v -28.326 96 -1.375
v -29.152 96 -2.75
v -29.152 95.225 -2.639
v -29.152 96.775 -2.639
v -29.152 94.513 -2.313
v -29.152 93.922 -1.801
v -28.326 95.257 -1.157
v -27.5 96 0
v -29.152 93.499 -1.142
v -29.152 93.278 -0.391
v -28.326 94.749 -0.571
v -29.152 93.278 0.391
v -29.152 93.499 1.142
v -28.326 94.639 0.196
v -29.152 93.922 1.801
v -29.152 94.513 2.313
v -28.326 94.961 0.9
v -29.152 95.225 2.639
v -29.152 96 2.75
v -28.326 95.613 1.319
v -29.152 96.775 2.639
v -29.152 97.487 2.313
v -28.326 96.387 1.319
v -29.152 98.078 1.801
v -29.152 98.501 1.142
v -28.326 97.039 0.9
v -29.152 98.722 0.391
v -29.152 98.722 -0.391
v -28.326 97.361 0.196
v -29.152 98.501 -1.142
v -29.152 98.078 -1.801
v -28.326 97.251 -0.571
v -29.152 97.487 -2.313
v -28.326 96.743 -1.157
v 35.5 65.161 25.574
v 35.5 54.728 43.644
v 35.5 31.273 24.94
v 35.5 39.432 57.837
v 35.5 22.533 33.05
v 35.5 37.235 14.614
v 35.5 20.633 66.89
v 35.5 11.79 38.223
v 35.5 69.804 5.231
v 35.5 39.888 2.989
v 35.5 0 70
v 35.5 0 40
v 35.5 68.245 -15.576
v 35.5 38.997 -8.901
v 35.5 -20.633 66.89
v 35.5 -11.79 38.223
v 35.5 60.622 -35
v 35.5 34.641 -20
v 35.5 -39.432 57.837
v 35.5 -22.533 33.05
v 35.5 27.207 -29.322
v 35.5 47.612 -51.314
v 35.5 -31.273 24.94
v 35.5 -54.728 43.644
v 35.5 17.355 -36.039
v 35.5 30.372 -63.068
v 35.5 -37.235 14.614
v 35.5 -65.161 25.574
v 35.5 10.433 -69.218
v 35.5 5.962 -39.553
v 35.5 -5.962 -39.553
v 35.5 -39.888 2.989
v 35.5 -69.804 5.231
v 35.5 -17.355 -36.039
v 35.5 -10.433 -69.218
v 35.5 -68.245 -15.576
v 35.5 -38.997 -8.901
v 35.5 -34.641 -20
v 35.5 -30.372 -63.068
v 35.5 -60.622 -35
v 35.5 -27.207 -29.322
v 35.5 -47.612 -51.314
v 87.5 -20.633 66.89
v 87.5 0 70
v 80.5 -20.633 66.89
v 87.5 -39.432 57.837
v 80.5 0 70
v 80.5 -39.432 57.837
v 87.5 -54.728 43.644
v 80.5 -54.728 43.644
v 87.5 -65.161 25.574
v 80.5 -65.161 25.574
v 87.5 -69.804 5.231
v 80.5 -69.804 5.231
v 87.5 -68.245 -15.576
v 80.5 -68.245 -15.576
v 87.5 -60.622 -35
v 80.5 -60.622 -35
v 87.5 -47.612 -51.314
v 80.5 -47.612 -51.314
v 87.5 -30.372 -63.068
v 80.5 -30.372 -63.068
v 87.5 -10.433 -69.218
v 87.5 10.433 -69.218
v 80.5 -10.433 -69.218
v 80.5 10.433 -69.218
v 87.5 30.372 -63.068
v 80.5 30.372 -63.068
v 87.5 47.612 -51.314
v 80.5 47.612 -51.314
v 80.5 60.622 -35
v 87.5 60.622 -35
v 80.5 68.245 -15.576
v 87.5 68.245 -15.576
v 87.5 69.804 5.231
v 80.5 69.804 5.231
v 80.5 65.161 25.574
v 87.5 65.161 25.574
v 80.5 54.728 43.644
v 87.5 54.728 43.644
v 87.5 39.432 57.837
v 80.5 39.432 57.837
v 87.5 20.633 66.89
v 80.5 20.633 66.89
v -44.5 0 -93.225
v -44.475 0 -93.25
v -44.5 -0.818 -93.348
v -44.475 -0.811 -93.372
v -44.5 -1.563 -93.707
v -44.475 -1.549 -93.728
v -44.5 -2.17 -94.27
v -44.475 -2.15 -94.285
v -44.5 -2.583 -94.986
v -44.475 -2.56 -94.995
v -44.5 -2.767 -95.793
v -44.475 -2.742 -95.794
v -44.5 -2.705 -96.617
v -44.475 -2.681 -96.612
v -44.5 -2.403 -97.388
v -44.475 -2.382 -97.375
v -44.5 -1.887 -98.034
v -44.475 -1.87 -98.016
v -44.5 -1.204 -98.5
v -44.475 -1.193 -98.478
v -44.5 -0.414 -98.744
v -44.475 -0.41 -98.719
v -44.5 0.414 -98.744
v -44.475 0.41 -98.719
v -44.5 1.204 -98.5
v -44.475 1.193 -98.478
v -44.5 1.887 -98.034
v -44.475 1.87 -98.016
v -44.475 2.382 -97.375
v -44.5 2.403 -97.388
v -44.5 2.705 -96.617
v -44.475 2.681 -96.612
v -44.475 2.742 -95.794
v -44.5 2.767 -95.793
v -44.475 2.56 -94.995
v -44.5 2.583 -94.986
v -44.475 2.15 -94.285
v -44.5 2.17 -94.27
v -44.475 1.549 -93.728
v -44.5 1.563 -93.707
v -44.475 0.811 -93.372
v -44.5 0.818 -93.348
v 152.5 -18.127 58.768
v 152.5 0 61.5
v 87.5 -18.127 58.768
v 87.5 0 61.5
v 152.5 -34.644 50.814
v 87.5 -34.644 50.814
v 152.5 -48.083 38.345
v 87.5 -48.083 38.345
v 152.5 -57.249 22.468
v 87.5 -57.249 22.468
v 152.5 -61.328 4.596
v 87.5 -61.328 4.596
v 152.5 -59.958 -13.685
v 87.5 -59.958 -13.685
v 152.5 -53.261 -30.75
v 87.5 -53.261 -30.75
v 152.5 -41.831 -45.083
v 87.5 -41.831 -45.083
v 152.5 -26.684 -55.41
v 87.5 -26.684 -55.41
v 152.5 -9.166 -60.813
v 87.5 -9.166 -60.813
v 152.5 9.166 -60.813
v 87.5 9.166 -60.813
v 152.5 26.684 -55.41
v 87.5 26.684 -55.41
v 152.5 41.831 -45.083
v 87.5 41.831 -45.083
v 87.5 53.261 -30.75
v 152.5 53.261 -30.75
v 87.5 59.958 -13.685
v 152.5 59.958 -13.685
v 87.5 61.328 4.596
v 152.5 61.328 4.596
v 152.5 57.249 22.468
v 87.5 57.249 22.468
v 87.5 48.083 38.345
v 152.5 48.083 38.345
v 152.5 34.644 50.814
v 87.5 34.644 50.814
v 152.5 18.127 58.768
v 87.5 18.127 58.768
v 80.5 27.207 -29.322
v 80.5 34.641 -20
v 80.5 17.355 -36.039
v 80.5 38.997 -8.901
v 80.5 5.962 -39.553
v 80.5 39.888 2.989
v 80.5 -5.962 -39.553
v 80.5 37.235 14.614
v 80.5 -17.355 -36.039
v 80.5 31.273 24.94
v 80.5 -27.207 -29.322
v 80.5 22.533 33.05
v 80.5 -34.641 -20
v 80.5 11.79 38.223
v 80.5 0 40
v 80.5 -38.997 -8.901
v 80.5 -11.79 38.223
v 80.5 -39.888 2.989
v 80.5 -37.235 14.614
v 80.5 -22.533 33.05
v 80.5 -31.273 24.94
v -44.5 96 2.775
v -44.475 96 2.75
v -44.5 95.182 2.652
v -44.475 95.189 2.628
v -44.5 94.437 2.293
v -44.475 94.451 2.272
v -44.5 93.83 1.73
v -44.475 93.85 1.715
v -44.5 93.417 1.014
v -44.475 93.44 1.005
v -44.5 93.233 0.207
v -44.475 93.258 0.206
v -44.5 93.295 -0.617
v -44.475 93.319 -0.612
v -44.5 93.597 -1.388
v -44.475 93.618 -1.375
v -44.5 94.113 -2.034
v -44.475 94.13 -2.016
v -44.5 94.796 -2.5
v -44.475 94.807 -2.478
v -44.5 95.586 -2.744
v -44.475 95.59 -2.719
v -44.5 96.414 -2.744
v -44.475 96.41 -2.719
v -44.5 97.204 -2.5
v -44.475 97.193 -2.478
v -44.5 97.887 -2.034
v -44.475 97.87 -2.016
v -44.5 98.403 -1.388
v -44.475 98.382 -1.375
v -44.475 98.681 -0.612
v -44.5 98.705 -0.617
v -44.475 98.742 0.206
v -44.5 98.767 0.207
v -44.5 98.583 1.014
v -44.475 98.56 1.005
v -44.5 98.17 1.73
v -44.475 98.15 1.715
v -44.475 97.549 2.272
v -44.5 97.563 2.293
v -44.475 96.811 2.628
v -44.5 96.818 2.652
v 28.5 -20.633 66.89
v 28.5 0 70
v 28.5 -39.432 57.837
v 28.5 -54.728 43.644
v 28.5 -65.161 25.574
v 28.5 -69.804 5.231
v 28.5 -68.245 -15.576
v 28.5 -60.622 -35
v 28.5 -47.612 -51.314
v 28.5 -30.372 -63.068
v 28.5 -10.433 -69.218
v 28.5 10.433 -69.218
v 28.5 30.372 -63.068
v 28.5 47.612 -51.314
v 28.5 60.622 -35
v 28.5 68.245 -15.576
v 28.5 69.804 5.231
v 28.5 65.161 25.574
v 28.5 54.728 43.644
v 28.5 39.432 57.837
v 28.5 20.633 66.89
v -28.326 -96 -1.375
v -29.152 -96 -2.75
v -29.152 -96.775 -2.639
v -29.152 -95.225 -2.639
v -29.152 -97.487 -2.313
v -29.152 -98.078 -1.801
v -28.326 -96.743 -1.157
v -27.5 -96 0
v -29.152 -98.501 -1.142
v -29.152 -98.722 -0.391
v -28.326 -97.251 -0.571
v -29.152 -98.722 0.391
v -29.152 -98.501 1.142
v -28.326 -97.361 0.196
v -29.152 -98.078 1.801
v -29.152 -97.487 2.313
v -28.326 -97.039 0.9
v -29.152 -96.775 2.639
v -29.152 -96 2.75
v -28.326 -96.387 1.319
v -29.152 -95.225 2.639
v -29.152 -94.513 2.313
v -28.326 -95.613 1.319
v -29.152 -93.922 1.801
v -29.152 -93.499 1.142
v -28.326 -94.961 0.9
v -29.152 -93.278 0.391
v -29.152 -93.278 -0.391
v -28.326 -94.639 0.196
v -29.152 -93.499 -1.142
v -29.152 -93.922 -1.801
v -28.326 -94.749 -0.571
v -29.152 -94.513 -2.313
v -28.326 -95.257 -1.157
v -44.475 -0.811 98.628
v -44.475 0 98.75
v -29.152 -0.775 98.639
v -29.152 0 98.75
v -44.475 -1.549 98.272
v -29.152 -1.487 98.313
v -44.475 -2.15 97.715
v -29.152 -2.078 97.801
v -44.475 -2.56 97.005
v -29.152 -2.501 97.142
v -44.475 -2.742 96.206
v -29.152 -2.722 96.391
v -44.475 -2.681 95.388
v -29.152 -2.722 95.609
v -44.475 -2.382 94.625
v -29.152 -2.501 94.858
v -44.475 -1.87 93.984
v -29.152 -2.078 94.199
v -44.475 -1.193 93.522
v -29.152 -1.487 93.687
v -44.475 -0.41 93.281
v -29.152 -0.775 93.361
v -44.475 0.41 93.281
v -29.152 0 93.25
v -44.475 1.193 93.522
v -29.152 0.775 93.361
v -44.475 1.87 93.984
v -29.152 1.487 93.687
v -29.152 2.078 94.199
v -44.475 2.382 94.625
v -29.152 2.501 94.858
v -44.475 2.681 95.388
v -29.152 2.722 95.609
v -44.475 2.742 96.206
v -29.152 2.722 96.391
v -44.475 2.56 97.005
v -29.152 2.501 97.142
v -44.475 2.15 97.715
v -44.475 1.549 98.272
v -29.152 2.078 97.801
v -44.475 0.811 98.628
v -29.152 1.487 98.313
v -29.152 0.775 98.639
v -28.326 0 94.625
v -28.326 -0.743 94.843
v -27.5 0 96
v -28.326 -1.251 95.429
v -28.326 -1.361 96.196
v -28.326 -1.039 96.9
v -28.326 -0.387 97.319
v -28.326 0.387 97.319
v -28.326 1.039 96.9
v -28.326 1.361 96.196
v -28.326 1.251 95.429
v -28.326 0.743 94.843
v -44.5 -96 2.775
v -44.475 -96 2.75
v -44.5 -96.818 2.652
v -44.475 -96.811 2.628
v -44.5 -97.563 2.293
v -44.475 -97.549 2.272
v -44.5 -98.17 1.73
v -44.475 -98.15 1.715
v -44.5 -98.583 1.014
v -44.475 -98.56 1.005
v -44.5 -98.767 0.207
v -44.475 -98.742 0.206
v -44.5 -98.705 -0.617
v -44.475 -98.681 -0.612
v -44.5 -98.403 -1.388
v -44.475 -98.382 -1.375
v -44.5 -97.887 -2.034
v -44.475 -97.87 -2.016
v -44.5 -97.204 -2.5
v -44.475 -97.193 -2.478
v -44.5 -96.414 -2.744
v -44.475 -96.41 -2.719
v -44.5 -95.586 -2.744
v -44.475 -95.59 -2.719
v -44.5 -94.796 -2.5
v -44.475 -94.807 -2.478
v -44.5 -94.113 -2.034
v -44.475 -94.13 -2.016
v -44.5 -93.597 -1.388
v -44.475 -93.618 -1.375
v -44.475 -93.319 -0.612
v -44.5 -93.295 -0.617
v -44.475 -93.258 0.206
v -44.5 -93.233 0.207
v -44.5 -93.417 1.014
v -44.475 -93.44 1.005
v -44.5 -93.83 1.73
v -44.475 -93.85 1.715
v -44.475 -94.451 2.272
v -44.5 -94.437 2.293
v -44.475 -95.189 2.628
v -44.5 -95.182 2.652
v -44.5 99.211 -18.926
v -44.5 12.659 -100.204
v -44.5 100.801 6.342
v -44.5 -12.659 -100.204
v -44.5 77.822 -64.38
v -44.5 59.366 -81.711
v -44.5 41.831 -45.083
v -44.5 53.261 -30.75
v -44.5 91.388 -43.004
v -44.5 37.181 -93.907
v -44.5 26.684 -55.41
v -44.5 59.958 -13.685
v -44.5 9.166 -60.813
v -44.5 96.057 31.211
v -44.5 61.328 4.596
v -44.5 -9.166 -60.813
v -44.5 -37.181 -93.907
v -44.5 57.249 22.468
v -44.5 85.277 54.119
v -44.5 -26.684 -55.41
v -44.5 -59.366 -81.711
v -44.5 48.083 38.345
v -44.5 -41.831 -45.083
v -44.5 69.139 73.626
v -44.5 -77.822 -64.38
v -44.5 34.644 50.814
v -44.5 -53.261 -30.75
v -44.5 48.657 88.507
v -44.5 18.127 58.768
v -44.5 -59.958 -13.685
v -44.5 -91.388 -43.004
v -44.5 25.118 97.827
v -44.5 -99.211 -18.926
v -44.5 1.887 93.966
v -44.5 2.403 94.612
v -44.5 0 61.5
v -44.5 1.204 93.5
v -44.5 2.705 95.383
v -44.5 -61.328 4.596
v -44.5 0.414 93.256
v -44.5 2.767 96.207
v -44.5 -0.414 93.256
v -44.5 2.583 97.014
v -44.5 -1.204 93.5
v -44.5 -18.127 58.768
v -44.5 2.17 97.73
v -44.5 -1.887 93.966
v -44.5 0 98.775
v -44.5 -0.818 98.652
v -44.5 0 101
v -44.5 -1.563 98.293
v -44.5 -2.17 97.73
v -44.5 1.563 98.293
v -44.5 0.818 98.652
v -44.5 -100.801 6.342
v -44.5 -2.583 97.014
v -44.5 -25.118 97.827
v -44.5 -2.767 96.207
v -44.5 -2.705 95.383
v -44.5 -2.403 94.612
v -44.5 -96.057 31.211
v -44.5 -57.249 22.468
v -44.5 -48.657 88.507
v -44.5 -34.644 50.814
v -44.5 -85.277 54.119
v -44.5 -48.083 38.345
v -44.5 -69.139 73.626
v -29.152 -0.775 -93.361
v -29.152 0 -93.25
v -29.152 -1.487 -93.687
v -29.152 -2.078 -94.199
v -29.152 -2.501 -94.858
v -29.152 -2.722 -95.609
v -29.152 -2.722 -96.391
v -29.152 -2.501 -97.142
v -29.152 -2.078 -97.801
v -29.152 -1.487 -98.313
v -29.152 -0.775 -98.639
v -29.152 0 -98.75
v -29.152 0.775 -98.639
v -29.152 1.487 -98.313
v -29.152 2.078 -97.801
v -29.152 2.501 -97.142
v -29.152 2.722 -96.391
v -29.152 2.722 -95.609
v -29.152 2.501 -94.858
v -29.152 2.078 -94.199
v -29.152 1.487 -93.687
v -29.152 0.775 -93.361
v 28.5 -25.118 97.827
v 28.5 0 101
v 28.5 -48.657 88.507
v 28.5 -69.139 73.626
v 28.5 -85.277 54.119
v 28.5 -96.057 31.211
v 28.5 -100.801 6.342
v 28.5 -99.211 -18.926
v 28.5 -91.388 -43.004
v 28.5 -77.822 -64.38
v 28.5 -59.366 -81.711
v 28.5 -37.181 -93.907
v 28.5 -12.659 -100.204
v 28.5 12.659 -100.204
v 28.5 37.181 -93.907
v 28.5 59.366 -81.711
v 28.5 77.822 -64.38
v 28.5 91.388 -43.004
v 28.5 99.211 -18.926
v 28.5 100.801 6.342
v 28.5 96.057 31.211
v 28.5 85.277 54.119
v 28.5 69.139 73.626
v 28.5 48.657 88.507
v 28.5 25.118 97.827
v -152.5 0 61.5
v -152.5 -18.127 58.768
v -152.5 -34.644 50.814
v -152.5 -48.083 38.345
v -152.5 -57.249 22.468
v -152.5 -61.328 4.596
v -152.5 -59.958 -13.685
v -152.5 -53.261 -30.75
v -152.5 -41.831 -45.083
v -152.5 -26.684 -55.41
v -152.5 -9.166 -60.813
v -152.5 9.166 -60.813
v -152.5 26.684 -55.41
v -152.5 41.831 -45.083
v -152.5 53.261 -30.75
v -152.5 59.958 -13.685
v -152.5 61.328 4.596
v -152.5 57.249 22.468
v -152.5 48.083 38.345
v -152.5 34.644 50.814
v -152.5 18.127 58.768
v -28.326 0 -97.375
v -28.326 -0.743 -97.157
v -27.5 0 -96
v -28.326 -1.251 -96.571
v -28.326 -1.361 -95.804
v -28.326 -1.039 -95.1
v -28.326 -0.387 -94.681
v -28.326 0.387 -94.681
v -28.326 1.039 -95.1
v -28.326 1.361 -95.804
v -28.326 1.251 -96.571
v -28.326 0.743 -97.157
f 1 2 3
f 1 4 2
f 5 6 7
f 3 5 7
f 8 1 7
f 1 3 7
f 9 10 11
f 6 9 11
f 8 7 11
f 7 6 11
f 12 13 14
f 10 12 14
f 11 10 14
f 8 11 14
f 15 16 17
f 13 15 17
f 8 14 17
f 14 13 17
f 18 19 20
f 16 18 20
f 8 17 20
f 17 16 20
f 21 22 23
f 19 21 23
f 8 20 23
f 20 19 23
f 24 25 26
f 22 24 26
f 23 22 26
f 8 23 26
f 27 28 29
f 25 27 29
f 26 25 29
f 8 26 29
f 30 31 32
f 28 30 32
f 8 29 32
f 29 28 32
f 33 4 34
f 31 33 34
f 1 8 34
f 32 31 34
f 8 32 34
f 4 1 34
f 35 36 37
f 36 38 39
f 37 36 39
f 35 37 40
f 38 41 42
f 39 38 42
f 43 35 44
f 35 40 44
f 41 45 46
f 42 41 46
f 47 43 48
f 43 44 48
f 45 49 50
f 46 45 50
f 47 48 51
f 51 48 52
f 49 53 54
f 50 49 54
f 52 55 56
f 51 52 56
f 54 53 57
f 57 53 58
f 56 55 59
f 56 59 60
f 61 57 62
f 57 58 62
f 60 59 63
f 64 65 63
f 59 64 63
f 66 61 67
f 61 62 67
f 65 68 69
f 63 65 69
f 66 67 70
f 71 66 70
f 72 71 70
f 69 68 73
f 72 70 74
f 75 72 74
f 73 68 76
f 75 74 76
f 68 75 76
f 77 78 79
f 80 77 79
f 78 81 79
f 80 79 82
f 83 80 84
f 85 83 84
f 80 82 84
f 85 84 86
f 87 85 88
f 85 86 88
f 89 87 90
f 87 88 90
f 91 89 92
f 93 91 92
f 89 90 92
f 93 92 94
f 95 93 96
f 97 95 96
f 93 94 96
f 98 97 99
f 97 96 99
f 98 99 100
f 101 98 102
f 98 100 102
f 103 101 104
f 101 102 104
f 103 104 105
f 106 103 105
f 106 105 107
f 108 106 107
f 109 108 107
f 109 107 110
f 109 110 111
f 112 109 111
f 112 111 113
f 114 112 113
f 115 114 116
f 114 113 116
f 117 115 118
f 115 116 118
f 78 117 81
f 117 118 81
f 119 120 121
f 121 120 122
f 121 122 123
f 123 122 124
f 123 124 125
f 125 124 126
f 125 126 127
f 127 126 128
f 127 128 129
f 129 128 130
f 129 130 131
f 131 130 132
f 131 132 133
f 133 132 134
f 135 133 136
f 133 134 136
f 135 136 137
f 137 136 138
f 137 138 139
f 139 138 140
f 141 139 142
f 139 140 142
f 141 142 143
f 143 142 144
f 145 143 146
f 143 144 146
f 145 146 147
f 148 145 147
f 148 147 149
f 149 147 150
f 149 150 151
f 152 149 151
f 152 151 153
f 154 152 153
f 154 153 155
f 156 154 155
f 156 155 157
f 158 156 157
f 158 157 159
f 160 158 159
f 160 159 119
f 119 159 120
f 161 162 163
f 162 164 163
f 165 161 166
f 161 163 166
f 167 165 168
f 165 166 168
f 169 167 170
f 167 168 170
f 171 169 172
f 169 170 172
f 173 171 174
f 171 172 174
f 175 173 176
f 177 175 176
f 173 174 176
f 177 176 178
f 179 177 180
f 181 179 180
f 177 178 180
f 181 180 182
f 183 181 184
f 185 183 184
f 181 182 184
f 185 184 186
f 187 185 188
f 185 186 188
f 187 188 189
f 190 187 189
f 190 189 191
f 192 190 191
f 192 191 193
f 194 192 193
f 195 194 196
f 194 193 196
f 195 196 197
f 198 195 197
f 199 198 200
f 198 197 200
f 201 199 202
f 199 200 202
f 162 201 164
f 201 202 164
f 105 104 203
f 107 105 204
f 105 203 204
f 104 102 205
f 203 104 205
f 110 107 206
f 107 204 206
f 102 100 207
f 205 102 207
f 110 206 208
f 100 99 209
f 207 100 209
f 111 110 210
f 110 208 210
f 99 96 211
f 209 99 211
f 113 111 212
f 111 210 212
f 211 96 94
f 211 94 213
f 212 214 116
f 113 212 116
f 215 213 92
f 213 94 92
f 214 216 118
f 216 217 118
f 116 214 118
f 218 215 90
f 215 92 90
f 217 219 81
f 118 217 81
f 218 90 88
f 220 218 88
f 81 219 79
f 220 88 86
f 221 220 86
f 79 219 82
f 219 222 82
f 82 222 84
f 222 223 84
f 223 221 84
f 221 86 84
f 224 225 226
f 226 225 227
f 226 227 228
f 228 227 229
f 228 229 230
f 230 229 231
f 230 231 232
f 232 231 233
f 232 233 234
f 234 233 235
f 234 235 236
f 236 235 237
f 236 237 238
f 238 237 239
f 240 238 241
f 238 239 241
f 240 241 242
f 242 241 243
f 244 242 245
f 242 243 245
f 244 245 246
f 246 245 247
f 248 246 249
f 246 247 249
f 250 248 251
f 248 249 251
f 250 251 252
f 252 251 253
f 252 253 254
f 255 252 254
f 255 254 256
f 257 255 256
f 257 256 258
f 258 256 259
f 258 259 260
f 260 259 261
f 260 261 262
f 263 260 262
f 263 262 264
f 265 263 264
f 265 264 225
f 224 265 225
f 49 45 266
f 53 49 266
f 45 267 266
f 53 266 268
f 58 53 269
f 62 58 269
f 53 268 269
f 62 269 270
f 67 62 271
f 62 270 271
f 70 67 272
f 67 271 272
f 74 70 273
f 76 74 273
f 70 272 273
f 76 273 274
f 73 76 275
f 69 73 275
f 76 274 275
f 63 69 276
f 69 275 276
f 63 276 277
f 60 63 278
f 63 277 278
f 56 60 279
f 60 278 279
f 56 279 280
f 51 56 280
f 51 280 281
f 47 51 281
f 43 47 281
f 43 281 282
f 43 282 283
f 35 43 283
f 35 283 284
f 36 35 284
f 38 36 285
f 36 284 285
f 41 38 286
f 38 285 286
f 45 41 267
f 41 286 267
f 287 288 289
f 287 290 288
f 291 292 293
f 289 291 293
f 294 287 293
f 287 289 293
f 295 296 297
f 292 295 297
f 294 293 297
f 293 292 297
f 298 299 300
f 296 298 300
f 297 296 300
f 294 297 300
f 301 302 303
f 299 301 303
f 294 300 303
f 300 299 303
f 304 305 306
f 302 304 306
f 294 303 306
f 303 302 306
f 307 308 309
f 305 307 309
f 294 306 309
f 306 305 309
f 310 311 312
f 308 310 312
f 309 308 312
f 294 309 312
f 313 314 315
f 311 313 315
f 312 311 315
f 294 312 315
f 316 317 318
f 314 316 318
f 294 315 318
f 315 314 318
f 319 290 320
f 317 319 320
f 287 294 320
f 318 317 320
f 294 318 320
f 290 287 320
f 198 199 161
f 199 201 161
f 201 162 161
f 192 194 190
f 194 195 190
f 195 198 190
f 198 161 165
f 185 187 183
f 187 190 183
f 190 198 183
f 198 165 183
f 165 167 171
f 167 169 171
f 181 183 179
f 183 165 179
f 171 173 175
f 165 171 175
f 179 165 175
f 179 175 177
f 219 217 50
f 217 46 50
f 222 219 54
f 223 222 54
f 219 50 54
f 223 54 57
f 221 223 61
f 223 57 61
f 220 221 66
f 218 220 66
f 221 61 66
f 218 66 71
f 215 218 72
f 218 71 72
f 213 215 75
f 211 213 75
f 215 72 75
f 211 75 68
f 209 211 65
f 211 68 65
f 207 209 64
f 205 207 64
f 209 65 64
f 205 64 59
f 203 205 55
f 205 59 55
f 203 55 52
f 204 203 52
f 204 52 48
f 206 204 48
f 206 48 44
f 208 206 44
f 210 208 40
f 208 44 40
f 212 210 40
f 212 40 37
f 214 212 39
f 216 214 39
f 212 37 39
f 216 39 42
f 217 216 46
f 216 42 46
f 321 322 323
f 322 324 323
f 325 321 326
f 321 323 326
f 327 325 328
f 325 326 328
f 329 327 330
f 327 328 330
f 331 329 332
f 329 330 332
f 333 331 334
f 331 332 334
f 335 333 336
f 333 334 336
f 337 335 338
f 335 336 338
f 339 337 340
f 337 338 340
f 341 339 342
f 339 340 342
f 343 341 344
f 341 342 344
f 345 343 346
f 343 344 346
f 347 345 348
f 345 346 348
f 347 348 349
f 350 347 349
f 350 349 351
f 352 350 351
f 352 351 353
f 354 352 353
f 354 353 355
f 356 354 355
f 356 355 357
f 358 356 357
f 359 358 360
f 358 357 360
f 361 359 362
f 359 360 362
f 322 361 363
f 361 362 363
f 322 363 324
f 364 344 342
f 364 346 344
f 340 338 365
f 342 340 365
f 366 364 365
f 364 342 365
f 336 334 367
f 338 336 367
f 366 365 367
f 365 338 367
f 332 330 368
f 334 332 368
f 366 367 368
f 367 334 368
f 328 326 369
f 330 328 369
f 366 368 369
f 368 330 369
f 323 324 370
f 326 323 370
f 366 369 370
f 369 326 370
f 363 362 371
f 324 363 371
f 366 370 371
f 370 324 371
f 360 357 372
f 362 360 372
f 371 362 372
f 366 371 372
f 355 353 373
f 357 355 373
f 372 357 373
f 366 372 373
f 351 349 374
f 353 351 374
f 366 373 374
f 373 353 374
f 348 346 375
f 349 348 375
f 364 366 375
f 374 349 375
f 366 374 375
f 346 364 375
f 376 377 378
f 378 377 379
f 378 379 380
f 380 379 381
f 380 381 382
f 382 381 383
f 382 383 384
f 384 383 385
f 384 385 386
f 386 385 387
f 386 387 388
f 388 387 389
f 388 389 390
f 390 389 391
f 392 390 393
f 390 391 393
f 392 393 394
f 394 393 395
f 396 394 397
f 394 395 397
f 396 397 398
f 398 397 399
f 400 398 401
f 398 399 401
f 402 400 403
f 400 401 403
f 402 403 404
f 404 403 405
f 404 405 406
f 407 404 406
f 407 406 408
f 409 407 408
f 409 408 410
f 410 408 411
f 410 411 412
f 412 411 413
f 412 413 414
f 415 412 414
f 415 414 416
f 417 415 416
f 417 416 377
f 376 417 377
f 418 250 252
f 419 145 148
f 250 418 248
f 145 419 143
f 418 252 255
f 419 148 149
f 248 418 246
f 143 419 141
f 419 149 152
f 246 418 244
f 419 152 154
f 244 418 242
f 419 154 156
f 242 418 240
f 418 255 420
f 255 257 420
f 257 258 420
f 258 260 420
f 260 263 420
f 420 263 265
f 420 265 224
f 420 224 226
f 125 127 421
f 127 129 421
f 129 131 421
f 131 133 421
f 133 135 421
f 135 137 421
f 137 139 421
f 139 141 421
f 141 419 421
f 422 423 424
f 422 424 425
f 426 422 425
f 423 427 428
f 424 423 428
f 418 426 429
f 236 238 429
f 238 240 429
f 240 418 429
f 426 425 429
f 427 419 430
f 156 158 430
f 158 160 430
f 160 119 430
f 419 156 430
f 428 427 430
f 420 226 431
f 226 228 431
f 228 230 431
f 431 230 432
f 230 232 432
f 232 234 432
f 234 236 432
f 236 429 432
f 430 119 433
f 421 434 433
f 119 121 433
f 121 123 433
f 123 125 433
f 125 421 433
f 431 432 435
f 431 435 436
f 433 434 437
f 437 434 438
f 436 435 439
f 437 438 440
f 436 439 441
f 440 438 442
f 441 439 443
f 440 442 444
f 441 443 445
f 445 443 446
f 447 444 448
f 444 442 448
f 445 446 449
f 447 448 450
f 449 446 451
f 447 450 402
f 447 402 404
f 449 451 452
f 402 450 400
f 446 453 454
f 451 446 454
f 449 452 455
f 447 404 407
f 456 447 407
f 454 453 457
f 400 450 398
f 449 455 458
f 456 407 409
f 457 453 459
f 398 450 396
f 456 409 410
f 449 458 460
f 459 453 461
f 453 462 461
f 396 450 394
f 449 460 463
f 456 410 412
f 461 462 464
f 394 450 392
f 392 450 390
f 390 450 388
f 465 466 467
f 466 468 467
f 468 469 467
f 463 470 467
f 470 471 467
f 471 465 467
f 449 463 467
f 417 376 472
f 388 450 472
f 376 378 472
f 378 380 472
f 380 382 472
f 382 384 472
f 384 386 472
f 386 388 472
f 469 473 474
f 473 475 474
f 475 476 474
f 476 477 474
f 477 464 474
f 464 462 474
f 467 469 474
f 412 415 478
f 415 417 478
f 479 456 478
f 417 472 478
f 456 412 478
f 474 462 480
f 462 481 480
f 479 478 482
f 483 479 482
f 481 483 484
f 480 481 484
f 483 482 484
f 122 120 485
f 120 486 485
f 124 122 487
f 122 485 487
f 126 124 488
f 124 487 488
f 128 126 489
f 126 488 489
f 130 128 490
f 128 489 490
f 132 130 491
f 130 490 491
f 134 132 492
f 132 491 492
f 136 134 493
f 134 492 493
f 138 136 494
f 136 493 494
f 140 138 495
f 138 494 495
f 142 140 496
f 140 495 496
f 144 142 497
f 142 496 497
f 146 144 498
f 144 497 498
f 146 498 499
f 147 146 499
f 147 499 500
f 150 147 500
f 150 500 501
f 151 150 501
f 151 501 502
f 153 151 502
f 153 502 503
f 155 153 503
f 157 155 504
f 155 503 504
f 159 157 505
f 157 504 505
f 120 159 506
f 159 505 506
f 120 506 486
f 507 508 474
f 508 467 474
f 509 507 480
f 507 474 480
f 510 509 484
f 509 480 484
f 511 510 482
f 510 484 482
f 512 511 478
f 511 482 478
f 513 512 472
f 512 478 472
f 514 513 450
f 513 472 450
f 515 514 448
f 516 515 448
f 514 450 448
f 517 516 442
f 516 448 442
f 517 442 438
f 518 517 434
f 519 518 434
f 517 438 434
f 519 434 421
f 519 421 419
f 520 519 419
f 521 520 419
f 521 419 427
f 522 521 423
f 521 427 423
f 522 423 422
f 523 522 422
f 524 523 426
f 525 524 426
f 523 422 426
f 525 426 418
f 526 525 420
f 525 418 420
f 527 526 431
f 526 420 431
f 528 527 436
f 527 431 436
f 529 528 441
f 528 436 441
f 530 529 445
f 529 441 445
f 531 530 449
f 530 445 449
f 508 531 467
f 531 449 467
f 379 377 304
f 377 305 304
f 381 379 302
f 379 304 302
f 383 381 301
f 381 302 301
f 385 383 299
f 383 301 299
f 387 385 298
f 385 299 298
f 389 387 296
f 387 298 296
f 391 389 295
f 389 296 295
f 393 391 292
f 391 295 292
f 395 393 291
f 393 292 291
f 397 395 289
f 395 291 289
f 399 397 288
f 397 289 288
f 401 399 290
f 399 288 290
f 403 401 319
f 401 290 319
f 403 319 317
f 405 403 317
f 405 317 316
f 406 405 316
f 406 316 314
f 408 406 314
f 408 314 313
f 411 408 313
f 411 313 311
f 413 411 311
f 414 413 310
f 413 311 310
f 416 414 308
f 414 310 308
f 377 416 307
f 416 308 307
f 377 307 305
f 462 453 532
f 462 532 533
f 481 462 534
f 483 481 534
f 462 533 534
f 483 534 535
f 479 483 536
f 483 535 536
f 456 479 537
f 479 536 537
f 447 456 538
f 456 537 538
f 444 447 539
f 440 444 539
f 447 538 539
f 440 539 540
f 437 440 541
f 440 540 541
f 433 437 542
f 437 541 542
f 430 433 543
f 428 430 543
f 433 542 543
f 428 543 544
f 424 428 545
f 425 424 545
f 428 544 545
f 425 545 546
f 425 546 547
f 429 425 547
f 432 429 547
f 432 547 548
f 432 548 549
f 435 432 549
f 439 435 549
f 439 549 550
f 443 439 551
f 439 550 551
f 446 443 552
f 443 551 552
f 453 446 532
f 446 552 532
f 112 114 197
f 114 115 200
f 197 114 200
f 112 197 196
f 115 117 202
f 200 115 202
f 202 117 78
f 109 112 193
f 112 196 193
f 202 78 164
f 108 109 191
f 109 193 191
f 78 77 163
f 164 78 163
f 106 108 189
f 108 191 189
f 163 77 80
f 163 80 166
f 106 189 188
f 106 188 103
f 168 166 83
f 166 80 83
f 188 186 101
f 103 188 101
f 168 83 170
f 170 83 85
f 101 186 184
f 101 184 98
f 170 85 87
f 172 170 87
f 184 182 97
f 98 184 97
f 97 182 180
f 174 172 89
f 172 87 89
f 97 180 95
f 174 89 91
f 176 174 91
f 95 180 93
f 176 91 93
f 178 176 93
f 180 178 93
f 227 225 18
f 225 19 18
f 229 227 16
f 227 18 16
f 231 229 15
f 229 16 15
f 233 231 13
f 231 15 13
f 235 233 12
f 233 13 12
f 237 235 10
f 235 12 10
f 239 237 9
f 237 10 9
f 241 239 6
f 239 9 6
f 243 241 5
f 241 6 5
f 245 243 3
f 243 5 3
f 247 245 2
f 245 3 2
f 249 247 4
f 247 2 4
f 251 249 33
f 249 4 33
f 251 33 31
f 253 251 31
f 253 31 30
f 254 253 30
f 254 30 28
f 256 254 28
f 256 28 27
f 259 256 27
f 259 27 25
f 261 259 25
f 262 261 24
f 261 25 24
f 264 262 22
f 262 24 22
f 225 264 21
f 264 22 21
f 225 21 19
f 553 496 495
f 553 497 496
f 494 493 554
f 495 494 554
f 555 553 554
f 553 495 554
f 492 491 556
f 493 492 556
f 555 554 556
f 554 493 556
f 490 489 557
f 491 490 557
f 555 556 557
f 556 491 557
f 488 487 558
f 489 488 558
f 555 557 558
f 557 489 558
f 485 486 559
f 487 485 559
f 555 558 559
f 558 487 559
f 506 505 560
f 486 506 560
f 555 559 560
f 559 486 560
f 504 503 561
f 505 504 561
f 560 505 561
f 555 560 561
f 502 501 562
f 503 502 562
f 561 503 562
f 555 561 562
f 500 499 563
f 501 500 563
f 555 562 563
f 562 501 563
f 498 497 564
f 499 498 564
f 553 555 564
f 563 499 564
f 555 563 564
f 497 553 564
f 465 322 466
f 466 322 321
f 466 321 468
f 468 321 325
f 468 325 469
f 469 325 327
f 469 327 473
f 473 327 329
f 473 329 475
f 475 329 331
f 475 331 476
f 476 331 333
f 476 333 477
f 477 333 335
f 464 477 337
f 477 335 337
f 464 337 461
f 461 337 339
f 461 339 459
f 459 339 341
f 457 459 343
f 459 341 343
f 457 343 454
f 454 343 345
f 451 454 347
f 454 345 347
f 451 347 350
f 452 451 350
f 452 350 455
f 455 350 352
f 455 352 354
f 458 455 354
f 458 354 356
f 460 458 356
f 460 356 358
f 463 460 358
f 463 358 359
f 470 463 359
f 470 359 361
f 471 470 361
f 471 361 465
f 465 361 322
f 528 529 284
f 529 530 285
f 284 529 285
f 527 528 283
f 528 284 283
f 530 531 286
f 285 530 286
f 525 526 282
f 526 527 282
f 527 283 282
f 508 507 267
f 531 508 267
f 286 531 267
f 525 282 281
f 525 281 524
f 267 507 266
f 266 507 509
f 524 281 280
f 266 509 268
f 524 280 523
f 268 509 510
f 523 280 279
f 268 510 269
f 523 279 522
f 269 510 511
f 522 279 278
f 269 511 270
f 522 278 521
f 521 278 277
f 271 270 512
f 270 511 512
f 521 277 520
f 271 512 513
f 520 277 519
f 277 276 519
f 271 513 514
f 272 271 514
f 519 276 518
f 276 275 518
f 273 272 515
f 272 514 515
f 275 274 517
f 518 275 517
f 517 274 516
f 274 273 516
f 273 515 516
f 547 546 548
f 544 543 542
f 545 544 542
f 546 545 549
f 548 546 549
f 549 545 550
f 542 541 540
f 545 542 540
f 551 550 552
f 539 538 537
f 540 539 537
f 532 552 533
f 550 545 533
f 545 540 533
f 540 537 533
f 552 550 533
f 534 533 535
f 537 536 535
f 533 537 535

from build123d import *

# Parameters (mm, degrees)
FORO_PER_VITE_M5_1_D           = 5.5
FORO_PER_VITE_M5_1_DEPTH       = 15.347633298
FORO_PER_VITE_M5_1_CSINK_D     = 5.55
FORO_PER_VITE_M5_1_CSINK_ANGLE = 90
FORO_PER_VITE_M5_1_TIP         = 1.652366702


with BuildPart() as part:
    # Schizzo1 → Rivoluzione1 (revolve)
    with BuildSketch(Plane.XY, mode=Mode.PRIVATE) as rivoluzione1_sk:
        Polygon((-152.5, 0), (152.5, 0), (152.5, 61.5), (87.5, 61.5), (87.5, 70), (80.5, 70), (80.5, 40), (35.5, 40), (35.5, 70), (28.5, 70), (28.5, 101), (-44.5, 101), (-44.5, 61.5), (-152.5, 61.5), align=None)
    revolve(rivoluzione1_sk.sketch.rotate(Axis((-1716.324322208, 0, 0), (1, 0, 0)), 90), axis=Axis((-1716.324322208, 0, 0), (1, 0, 0)))

    # Foro per Vite M5-1
    with Locations(Plane(origin=(-44.5, 96, 0), x_dir=(0, 0, -1), z_dir=(-1, 0, 0))):
        with Locations((0, 0), (-96, 96), (0, 192), (96, 96)):
            CounterSinkHole(FORO_PER_VITE_M5_1_D / 2, FORO_PER_VITE_M5_1_CSINK_D / 2, depth=FORO_PER_VITE_M5_1_DEPTH, counter_sink_angle=FORO_PER_VITE_M5_1_CSINK_ANGLE)
            with Locations((0, 0, -(FORO_PER_VITE_M5_1_DEPTH + FORO_PER_VITE_M5_1_TIP / 2))):  # 118° drill point
                Cone(0, FORO_PER_VITE_M5_1_D / 2, FORO_PER_VITE_M5_1_TIP, mode=Mode.SUBTRACT)


solid = part.part
